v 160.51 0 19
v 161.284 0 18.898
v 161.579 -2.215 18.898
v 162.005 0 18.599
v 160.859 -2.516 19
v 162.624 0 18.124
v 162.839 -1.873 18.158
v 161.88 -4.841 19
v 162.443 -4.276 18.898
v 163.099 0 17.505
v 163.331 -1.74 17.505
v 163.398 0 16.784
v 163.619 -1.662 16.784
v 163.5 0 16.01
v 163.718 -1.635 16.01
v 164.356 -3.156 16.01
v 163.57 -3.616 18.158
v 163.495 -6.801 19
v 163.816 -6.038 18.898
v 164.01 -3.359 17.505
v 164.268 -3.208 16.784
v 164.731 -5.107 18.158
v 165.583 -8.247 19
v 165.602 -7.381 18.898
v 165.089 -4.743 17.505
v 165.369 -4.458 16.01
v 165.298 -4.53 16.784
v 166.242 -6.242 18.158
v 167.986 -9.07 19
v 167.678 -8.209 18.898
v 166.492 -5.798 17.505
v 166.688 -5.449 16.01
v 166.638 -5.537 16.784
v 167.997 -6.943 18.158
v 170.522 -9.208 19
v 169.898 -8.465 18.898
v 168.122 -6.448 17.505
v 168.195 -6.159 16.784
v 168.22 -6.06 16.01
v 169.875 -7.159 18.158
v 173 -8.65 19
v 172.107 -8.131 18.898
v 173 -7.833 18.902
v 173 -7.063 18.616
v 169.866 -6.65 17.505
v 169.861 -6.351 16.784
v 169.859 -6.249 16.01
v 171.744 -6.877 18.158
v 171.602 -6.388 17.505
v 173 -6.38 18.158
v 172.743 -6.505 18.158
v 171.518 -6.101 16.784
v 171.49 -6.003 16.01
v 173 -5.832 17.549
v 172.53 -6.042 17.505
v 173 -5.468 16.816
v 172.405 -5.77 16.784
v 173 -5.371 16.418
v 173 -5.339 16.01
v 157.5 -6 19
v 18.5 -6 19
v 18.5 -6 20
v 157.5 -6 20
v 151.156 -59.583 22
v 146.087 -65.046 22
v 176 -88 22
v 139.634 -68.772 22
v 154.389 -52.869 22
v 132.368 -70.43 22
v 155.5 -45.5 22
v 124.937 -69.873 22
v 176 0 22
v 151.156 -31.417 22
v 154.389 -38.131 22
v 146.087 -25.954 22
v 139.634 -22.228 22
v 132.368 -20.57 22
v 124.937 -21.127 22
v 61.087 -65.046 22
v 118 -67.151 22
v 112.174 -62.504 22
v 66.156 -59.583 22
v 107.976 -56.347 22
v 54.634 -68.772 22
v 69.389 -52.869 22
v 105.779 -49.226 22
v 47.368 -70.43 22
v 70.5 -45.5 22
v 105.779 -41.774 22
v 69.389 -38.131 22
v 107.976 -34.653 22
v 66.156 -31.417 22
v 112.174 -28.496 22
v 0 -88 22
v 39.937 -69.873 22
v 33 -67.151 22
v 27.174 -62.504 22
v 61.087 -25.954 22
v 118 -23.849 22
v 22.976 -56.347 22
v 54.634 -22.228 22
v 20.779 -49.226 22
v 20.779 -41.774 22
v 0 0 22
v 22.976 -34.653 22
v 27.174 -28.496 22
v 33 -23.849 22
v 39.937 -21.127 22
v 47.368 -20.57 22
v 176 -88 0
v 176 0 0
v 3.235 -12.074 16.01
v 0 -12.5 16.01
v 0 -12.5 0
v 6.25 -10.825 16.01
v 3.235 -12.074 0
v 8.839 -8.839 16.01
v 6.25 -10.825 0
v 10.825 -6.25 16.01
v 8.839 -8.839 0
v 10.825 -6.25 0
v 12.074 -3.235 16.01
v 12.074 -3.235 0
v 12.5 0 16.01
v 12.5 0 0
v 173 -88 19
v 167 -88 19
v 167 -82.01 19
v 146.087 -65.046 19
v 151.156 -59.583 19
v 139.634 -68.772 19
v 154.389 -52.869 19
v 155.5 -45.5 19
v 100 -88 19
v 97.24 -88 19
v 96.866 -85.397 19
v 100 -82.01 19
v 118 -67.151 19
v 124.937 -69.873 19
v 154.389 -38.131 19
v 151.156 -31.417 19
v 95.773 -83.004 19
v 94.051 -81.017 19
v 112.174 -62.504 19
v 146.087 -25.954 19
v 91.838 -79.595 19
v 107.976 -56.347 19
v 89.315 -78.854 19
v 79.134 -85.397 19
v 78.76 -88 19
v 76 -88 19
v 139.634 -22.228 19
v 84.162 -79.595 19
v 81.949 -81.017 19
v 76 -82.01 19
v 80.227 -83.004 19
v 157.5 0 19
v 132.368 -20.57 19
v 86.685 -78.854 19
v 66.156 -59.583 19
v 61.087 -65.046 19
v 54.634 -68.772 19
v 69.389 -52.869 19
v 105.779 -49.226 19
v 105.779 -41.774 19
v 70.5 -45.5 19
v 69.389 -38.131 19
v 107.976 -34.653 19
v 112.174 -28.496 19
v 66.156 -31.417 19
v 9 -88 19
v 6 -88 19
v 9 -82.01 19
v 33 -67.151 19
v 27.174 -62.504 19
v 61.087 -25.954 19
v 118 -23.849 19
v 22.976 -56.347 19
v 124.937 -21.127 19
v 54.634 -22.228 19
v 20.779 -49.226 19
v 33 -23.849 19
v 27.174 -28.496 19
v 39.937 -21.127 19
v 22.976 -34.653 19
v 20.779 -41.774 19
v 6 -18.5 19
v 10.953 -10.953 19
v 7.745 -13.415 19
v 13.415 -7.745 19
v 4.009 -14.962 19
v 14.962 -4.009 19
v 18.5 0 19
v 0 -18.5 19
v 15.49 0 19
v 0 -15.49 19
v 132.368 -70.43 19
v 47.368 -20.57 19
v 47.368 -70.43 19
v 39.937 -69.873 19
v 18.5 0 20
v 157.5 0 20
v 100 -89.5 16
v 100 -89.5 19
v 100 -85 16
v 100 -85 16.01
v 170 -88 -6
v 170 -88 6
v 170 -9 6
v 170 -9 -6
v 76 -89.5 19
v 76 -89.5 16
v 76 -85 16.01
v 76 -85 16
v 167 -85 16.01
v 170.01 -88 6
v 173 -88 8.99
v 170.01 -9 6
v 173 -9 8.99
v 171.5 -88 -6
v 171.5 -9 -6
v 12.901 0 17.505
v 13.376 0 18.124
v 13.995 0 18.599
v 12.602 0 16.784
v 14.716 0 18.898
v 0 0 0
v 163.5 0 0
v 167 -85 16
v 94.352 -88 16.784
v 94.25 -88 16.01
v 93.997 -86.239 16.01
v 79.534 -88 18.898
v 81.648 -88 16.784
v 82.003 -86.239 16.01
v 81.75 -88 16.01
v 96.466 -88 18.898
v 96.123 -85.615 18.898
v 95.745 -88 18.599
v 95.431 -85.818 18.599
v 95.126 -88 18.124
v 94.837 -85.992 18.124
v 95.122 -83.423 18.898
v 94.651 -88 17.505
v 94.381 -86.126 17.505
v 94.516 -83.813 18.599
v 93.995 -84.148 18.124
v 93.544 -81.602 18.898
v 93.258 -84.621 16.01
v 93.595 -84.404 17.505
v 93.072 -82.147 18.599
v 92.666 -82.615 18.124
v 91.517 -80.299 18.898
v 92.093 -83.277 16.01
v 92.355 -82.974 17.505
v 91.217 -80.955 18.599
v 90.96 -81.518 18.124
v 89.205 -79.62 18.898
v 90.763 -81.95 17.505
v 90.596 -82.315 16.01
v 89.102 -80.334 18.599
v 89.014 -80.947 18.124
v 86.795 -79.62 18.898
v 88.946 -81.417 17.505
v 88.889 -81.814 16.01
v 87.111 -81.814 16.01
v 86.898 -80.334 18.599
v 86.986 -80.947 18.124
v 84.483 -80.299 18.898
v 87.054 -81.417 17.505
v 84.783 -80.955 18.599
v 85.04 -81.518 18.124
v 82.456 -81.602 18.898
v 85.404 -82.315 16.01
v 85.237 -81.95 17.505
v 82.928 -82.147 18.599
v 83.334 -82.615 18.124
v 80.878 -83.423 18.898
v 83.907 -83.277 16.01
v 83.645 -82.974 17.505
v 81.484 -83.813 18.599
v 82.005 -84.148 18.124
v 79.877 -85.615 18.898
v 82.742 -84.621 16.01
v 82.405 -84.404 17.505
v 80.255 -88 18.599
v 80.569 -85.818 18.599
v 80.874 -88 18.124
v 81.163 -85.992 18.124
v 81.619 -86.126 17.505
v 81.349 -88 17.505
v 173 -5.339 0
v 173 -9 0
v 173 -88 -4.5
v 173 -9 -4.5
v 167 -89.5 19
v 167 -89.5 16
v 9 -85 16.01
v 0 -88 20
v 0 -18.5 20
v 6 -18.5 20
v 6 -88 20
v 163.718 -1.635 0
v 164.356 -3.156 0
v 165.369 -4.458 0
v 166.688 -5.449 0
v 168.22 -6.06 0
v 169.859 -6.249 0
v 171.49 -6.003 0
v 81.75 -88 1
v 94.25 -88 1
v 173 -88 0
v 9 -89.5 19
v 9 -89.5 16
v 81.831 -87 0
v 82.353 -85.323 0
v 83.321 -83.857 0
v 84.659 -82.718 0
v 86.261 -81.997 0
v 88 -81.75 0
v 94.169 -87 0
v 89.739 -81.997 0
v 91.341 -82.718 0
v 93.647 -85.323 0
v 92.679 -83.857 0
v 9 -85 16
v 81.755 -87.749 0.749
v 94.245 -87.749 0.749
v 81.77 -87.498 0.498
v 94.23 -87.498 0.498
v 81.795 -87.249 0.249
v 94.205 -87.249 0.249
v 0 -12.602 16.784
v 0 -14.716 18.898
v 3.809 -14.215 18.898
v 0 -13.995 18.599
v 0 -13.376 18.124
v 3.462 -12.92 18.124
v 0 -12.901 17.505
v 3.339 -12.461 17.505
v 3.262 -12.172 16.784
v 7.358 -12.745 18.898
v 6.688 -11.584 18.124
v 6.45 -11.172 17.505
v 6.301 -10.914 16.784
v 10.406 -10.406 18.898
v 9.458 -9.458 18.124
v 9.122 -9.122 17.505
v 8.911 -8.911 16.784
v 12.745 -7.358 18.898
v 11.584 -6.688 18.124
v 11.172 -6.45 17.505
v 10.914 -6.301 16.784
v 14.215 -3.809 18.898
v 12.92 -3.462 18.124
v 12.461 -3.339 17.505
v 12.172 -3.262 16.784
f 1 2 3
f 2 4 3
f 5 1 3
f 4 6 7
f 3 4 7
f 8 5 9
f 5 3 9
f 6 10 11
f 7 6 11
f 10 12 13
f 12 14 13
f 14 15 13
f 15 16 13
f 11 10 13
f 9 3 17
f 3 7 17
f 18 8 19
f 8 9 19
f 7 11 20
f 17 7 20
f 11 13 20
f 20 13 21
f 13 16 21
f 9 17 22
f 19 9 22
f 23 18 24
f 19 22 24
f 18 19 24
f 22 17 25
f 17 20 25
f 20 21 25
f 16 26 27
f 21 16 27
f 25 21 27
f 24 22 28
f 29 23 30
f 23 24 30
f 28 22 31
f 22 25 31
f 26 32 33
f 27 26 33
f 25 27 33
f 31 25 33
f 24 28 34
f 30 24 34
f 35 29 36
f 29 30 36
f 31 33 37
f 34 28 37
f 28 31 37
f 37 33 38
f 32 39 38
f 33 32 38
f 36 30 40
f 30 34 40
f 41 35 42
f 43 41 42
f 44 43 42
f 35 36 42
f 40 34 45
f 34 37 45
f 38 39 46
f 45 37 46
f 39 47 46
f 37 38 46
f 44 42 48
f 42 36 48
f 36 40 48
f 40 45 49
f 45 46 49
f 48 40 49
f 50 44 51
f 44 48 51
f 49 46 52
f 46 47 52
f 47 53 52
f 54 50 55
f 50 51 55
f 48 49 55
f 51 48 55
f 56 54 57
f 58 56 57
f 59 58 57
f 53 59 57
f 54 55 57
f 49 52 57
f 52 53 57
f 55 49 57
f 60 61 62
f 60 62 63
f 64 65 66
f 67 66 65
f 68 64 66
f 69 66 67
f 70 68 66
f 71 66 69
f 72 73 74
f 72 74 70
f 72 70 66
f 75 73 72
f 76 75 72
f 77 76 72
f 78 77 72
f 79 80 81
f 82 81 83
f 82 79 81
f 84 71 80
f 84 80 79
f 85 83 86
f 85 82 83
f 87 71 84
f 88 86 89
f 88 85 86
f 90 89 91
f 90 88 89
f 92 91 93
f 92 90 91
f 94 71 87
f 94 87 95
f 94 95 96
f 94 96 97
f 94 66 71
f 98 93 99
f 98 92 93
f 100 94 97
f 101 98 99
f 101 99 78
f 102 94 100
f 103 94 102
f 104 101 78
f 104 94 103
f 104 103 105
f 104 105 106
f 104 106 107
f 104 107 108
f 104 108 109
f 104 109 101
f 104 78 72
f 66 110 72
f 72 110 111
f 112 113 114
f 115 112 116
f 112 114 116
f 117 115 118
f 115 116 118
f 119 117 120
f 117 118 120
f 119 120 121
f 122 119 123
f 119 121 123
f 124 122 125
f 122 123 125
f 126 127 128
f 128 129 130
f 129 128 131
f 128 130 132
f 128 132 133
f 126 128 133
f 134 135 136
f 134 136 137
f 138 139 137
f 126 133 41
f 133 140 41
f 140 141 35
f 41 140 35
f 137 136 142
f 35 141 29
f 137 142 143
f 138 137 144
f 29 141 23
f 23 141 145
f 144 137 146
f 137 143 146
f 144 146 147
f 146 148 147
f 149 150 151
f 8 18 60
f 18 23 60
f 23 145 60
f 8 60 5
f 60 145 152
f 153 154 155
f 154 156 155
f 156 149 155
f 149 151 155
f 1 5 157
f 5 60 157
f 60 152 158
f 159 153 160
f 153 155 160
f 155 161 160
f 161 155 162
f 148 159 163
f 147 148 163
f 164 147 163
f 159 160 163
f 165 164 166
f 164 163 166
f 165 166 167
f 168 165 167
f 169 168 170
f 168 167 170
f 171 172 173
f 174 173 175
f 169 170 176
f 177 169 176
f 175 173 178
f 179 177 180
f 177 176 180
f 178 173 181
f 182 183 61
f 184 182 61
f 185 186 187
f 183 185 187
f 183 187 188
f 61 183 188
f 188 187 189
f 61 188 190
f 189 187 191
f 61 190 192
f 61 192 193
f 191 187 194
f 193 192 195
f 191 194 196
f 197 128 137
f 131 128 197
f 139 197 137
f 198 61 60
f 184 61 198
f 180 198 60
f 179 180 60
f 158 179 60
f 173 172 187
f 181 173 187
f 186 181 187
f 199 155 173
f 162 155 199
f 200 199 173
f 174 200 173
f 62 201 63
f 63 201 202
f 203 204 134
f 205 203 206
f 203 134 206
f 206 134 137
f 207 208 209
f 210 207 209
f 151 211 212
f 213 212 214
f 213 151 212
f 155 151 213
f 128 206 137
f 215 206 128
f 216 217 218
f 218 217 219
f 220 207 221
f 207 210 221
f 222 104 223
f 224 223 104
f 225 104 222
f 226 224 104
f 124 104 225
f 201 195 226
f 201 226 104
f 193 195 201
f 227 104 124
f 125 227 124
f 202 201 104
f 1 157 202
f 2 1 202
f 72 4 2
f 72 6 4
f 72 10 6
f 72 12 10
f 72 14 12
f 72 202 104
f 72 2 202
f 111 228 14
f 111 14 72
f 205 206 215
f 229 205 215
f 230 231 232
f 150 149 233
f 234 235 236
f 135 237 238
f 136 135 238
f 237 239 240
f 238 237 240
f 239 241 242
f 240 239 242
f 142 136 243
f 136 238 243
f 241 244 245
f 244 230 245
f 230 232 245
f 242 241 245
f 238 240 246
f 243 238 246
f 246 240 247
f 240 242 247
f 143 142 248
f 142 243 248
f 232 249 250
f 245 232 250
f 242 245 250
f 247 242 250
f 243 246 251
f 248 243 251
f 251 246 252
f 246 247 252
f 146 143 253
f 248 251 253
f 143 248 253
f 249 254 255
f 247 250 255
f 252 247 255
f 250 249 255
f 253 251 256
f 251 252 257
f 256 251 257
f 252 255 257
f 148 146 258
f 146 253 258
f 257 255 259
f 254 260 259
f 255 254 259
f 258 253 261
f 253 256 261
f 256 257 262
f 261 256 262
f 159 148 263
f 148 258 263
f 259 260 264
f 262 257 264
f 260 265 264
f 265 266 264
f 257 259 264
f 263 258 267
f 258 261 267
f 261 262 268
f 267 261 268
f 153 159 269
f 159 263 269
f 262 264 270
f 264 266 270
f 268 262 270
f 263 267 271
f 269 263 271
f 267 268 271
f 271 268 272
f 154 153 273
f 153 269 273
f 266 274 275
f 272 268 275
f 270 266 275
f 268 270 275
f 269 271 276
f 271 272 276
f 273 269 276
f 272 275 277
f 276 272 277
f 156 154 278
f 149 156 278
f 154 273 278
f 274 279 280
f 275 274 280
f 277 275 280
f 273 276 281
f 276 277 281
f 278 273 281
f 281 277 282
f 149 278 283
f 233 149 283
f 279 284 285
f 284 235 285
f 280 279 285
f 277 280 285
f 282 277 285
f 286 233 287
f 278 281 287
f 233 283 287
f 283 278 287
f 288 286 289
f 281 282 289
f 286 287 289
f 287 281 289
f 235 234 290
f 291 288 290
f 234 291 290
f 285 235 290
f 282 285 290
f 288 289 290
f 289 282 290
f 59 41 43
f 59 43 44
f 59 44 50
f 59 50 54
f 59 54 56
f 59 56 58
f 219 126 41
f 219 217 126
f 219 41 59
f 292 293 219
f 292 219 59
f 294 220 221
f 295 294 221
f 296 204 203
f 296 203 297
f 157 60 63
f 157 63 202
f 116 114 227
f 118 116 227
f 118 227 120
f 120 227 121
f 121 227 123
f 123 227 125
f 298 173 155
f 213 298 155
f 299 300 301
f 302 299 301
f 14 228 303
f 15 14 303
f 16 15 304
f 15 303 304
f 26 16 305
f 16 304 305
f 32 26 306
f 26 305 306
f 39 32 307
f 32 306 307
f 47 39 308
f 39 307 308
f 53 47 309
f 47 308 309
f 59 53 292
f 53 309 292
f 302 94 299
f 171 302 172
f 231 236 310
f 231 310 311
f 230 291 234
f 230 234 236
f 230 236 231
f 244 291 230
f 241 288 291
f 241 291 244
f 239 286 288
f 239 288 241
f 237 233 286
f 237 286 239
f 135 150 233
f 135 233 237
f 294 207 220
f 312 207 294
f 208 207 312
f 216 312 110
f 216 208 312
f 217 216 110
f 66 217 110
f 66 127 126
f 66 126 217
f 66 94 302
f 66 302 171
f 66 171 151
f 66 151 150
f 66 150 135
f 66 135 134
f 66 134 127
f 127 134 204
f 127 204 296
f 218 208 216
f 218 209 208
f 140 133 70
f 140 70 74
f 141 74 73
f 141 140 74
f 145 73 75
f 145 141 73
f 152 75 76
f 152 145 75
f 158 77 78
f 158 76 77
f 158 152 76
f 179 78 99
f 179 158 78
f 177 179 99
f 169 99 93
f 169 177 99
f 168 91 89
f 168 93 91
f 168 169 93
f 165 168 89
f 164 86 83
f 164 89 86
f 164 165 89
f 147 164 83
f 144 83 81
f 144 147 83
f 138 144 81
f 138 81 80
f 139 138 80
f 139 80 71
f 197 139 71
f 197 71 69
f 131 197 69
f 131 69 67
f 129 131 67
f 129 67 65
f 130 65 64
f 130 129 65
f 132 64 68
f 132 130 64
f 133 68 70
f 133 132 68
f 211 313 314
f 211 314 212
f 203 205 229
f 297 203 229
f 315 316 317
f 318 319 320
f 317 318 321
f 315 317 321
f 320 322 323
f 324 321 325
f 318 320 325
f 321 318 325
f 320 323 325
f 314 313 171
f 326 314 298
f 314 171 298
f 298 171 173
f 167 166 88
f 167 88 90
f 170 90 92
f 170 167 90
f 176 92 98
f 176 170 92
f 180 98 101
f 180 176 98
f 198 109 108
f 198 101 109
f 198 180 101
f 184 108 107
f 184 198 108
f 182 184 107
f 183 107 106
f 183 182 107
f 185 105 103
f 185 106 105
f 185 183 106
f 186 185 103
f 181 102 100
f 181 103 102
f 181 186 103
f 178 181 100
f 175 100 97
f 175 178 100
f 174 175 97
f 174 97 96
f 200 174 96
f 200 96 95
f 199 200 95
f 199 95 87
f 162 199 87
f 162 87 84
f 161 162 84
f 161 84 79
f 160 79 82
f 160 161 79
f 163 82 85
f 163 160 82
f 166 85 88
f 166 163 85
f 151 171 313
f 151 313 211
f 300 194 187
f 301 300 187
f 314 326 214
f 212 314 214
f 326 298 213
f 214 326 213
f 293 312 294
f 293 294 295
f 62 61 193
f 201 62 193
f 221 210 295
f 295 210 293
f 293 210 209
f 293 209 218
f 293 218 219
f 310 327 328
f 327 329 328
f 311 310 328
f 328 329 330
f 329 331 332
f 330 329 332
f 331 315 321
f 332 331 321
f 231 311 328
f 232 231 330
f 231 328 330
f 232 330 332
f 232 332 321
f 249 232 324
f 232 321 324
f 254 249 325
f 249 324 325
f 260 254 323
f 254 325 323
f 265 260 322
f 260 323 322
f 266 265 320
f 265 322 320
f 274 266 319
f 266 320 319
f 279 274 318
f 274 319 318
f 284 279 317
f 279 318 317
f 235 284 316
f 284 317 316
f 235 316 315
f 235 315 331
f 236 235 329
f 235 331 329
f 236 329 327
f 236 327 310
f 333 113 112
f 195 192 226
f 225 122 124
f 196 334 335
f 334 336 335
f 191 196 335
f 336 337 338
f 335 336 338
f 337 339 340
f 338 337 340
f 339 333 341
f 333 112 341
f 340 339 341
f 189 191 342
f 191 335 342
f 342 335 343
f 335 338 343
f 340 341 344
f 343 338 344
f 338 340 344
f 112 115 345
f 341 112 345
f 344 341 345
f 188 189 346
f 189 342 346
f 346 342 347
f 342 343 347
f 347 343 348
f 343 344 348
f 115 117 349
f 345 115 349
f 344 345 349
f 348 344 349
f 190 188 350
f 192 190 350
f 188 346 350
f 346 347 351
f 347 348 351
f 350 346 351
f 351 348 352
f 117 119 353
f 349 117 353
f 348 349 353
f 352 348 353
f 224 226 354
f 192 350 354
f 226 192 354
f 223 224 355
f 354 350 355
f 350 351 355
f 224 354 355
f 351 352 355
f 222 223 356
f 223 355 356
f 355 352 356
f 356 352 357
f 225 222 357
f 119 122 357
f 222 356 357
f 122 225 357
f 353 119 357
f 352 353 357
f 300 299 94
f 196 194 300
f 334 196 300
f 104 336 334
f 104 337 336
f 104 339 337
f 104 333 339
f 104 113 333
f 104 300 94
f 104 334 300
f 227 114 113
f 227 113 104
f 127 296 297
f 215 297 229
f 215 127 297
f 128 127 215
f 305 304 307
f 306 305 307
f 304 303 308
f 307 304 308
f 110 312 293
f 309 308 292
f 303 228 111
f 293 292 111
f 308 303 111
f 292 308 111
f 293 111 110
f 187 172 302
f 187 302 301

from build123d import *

# Parameters (mm, degrees)
SKETCH063_W          = 88
SKETCH063_H          = 3
PAD030_DEPTH         = 176
SKETCH064_R          = 25
POCKET030_DEPTH      = 100
POCKET030_DEPTH_BACK = 100
PAD031_DEPTH         = 19
SKETCH066_W          = 139
SKETCH066_H          = 6
SKETCH066_W_2        = 6
SKETCH066_H_2        = 69.5
POCKET031_DEPTH      = 20
SKETCH067_W          = 3
SKETCH067_H          = 88
PAD032_DEPTH         = 19
SKETCH068_W          = 3
SKETCH068_H          = 79
PAD033_DEPTH         = 6
PAD033_DEPTH_BACK    = 6
CHAMFER009_SIZE      = 2.99
CHAMFER010_SIZE      = 1.5
FILLET017_R          = 2.99
SKETCH087_W          = 67
SKETCH087_H          = 4.5
PAD038_DEPTH         = 3
CHAMFER012_SIZE      = 2.99
CHAMFER014_SIZE      = 1


with BuildPart() as part:
    # Sketch063 → Pad030 (new body)
    with BuildSketch(Plane.YZ):
        with Locations((-44, 20.5)):
            Rectangle(SKETCH063_W, SKETCH063_H)
    extrude(amount=PAD030_DEPTH)

    # Sketch064 → Pocket030 (cut, two sides)
    with BuildSketch(Plane.XY) as pocket030_sk:
        with Locations((45.5, -45.5)):
            Circle(SKETCH064_R)
        with Locations((130.5, -45.5)):
            Circle(SKETCH064_R)
    extrude(amount=-POCKET030_DEPTH, mode=Mode.SUBTRACT)
    extrude(pocket030_sk.sketch, amount=POCKET030_DEPTH_BACK, mode=Mode.SUBTRACT)

    # Sketch065 → Pad031 (join)
    with BuildSketch(Plane.XY):
        with BuildLine():
            ThreePointArc((0, -12.5), (8.838835, -8.838835), (12.5, 0))
            Line((0, 0), (12.5, 0))
            Line((0, -12.5), (0, 0))
        make_face()
        with BuildLine():
            ThreePointArc((163.5, 0), (169.75, -6.25), (176, 0))
            Line((163.5, 0), (176, 0))
        make_face()
        with BuildLine():
            ThreePointArc((94.25, -88), (88, -81.75), (81.75, -88))
            Line((81.75, -88), (94.25, -88))
        make_face()
    extrude(amount=PAD031_DEPTH)

    # Sketch066 → Pocket031 (cut)
    with BuildSketch(Plane.XY):
        with Locations((88, -3)):
            Rectangle(SKETCH066_W, SKETCH066_H)
        with Locations((3, -53.25)):
            Rectangle(SKETCH066_W_2, SKETCH066_H_2)
    extrude(amount=POCKET031_DEPTH, mode=Mode.SUBTRACT)

    # Sketch067 → Pad032 (join)
    with BuildSketch(Plane.XY):
        with Locations((174.5, -44)):
            Rectangle(SKETCH067_W, SKETCH067_H)
    extrude(amount=PAD032_DEPTH)

    # Sketch068 → Pad033 (join, two sides)
    with BuildSketch(Plane.XY) as pad033_sk:
        with Locations((171.5, -48.5)):
            Rectangle(SKETCH068_W, SKETCH068_H)
    extrude(amount=PAD033_DEPTH)
    extrude(pad033_sk.sketch, amount=-PAD033_DEPTH_BACK)

    # Chamfer009
    chamfer009_edges = [part.edges().sort_by_distance(p)[0] for p in [
        (173, -48.5, 6),
    ]]
    chamfer(chamfer009_edges, length=CHAMFER009_SIZE)

    # Chamfer010
    chamfer010_edges = [part.edges().sort_by_distance(p)[0] for p in [
        (173, -48.5, -6),
    ]]
    chamfer(chamfer010_edges, length=CHAMFER010_SIZE)

    # Fillet017
    fillet017_edges = [part.edges().sort_by_distance(p)[0] for p in [
        (166.688138, -5.448624, 19),
        (88, -81.75, 19),
        (8.838835, -8.838835, 19),
    ]]
    fillet(fillet017_edges, radius=FILLET017_R)

    # Sketch087 → Pad038 (join)
    with BuildSketch(Plane.XY.offset(19)):
        with Locations((42.5, -87.25)):
            Rectangle(SKETCH087_W, SKETCH087_H)
        with Locations((133.5, -87.25)):
            Rectangle(SKETCH087_W, SKETCH087_H)
    extrude(amount=-PAD038_DEPTH)

    # Chamfer012
    chamfer012_edges = [part.edges().sort_by_distance(p)[0] for p in [
        (133.5, -85, 19),
        (42.5, -85, 19),
    ]]
    chamfer(chamfer012_edges, length=CHAMFER012_SIZE)

    # Chamfer014
    chamfer014_edges = [part.edges().sort_by_distance(p)[0] for p in [
        (88, -88, 0),
    ]]
    chamfer(chamfer014_edges, length=CHAMFER014_SIZE)


solid = part.part
